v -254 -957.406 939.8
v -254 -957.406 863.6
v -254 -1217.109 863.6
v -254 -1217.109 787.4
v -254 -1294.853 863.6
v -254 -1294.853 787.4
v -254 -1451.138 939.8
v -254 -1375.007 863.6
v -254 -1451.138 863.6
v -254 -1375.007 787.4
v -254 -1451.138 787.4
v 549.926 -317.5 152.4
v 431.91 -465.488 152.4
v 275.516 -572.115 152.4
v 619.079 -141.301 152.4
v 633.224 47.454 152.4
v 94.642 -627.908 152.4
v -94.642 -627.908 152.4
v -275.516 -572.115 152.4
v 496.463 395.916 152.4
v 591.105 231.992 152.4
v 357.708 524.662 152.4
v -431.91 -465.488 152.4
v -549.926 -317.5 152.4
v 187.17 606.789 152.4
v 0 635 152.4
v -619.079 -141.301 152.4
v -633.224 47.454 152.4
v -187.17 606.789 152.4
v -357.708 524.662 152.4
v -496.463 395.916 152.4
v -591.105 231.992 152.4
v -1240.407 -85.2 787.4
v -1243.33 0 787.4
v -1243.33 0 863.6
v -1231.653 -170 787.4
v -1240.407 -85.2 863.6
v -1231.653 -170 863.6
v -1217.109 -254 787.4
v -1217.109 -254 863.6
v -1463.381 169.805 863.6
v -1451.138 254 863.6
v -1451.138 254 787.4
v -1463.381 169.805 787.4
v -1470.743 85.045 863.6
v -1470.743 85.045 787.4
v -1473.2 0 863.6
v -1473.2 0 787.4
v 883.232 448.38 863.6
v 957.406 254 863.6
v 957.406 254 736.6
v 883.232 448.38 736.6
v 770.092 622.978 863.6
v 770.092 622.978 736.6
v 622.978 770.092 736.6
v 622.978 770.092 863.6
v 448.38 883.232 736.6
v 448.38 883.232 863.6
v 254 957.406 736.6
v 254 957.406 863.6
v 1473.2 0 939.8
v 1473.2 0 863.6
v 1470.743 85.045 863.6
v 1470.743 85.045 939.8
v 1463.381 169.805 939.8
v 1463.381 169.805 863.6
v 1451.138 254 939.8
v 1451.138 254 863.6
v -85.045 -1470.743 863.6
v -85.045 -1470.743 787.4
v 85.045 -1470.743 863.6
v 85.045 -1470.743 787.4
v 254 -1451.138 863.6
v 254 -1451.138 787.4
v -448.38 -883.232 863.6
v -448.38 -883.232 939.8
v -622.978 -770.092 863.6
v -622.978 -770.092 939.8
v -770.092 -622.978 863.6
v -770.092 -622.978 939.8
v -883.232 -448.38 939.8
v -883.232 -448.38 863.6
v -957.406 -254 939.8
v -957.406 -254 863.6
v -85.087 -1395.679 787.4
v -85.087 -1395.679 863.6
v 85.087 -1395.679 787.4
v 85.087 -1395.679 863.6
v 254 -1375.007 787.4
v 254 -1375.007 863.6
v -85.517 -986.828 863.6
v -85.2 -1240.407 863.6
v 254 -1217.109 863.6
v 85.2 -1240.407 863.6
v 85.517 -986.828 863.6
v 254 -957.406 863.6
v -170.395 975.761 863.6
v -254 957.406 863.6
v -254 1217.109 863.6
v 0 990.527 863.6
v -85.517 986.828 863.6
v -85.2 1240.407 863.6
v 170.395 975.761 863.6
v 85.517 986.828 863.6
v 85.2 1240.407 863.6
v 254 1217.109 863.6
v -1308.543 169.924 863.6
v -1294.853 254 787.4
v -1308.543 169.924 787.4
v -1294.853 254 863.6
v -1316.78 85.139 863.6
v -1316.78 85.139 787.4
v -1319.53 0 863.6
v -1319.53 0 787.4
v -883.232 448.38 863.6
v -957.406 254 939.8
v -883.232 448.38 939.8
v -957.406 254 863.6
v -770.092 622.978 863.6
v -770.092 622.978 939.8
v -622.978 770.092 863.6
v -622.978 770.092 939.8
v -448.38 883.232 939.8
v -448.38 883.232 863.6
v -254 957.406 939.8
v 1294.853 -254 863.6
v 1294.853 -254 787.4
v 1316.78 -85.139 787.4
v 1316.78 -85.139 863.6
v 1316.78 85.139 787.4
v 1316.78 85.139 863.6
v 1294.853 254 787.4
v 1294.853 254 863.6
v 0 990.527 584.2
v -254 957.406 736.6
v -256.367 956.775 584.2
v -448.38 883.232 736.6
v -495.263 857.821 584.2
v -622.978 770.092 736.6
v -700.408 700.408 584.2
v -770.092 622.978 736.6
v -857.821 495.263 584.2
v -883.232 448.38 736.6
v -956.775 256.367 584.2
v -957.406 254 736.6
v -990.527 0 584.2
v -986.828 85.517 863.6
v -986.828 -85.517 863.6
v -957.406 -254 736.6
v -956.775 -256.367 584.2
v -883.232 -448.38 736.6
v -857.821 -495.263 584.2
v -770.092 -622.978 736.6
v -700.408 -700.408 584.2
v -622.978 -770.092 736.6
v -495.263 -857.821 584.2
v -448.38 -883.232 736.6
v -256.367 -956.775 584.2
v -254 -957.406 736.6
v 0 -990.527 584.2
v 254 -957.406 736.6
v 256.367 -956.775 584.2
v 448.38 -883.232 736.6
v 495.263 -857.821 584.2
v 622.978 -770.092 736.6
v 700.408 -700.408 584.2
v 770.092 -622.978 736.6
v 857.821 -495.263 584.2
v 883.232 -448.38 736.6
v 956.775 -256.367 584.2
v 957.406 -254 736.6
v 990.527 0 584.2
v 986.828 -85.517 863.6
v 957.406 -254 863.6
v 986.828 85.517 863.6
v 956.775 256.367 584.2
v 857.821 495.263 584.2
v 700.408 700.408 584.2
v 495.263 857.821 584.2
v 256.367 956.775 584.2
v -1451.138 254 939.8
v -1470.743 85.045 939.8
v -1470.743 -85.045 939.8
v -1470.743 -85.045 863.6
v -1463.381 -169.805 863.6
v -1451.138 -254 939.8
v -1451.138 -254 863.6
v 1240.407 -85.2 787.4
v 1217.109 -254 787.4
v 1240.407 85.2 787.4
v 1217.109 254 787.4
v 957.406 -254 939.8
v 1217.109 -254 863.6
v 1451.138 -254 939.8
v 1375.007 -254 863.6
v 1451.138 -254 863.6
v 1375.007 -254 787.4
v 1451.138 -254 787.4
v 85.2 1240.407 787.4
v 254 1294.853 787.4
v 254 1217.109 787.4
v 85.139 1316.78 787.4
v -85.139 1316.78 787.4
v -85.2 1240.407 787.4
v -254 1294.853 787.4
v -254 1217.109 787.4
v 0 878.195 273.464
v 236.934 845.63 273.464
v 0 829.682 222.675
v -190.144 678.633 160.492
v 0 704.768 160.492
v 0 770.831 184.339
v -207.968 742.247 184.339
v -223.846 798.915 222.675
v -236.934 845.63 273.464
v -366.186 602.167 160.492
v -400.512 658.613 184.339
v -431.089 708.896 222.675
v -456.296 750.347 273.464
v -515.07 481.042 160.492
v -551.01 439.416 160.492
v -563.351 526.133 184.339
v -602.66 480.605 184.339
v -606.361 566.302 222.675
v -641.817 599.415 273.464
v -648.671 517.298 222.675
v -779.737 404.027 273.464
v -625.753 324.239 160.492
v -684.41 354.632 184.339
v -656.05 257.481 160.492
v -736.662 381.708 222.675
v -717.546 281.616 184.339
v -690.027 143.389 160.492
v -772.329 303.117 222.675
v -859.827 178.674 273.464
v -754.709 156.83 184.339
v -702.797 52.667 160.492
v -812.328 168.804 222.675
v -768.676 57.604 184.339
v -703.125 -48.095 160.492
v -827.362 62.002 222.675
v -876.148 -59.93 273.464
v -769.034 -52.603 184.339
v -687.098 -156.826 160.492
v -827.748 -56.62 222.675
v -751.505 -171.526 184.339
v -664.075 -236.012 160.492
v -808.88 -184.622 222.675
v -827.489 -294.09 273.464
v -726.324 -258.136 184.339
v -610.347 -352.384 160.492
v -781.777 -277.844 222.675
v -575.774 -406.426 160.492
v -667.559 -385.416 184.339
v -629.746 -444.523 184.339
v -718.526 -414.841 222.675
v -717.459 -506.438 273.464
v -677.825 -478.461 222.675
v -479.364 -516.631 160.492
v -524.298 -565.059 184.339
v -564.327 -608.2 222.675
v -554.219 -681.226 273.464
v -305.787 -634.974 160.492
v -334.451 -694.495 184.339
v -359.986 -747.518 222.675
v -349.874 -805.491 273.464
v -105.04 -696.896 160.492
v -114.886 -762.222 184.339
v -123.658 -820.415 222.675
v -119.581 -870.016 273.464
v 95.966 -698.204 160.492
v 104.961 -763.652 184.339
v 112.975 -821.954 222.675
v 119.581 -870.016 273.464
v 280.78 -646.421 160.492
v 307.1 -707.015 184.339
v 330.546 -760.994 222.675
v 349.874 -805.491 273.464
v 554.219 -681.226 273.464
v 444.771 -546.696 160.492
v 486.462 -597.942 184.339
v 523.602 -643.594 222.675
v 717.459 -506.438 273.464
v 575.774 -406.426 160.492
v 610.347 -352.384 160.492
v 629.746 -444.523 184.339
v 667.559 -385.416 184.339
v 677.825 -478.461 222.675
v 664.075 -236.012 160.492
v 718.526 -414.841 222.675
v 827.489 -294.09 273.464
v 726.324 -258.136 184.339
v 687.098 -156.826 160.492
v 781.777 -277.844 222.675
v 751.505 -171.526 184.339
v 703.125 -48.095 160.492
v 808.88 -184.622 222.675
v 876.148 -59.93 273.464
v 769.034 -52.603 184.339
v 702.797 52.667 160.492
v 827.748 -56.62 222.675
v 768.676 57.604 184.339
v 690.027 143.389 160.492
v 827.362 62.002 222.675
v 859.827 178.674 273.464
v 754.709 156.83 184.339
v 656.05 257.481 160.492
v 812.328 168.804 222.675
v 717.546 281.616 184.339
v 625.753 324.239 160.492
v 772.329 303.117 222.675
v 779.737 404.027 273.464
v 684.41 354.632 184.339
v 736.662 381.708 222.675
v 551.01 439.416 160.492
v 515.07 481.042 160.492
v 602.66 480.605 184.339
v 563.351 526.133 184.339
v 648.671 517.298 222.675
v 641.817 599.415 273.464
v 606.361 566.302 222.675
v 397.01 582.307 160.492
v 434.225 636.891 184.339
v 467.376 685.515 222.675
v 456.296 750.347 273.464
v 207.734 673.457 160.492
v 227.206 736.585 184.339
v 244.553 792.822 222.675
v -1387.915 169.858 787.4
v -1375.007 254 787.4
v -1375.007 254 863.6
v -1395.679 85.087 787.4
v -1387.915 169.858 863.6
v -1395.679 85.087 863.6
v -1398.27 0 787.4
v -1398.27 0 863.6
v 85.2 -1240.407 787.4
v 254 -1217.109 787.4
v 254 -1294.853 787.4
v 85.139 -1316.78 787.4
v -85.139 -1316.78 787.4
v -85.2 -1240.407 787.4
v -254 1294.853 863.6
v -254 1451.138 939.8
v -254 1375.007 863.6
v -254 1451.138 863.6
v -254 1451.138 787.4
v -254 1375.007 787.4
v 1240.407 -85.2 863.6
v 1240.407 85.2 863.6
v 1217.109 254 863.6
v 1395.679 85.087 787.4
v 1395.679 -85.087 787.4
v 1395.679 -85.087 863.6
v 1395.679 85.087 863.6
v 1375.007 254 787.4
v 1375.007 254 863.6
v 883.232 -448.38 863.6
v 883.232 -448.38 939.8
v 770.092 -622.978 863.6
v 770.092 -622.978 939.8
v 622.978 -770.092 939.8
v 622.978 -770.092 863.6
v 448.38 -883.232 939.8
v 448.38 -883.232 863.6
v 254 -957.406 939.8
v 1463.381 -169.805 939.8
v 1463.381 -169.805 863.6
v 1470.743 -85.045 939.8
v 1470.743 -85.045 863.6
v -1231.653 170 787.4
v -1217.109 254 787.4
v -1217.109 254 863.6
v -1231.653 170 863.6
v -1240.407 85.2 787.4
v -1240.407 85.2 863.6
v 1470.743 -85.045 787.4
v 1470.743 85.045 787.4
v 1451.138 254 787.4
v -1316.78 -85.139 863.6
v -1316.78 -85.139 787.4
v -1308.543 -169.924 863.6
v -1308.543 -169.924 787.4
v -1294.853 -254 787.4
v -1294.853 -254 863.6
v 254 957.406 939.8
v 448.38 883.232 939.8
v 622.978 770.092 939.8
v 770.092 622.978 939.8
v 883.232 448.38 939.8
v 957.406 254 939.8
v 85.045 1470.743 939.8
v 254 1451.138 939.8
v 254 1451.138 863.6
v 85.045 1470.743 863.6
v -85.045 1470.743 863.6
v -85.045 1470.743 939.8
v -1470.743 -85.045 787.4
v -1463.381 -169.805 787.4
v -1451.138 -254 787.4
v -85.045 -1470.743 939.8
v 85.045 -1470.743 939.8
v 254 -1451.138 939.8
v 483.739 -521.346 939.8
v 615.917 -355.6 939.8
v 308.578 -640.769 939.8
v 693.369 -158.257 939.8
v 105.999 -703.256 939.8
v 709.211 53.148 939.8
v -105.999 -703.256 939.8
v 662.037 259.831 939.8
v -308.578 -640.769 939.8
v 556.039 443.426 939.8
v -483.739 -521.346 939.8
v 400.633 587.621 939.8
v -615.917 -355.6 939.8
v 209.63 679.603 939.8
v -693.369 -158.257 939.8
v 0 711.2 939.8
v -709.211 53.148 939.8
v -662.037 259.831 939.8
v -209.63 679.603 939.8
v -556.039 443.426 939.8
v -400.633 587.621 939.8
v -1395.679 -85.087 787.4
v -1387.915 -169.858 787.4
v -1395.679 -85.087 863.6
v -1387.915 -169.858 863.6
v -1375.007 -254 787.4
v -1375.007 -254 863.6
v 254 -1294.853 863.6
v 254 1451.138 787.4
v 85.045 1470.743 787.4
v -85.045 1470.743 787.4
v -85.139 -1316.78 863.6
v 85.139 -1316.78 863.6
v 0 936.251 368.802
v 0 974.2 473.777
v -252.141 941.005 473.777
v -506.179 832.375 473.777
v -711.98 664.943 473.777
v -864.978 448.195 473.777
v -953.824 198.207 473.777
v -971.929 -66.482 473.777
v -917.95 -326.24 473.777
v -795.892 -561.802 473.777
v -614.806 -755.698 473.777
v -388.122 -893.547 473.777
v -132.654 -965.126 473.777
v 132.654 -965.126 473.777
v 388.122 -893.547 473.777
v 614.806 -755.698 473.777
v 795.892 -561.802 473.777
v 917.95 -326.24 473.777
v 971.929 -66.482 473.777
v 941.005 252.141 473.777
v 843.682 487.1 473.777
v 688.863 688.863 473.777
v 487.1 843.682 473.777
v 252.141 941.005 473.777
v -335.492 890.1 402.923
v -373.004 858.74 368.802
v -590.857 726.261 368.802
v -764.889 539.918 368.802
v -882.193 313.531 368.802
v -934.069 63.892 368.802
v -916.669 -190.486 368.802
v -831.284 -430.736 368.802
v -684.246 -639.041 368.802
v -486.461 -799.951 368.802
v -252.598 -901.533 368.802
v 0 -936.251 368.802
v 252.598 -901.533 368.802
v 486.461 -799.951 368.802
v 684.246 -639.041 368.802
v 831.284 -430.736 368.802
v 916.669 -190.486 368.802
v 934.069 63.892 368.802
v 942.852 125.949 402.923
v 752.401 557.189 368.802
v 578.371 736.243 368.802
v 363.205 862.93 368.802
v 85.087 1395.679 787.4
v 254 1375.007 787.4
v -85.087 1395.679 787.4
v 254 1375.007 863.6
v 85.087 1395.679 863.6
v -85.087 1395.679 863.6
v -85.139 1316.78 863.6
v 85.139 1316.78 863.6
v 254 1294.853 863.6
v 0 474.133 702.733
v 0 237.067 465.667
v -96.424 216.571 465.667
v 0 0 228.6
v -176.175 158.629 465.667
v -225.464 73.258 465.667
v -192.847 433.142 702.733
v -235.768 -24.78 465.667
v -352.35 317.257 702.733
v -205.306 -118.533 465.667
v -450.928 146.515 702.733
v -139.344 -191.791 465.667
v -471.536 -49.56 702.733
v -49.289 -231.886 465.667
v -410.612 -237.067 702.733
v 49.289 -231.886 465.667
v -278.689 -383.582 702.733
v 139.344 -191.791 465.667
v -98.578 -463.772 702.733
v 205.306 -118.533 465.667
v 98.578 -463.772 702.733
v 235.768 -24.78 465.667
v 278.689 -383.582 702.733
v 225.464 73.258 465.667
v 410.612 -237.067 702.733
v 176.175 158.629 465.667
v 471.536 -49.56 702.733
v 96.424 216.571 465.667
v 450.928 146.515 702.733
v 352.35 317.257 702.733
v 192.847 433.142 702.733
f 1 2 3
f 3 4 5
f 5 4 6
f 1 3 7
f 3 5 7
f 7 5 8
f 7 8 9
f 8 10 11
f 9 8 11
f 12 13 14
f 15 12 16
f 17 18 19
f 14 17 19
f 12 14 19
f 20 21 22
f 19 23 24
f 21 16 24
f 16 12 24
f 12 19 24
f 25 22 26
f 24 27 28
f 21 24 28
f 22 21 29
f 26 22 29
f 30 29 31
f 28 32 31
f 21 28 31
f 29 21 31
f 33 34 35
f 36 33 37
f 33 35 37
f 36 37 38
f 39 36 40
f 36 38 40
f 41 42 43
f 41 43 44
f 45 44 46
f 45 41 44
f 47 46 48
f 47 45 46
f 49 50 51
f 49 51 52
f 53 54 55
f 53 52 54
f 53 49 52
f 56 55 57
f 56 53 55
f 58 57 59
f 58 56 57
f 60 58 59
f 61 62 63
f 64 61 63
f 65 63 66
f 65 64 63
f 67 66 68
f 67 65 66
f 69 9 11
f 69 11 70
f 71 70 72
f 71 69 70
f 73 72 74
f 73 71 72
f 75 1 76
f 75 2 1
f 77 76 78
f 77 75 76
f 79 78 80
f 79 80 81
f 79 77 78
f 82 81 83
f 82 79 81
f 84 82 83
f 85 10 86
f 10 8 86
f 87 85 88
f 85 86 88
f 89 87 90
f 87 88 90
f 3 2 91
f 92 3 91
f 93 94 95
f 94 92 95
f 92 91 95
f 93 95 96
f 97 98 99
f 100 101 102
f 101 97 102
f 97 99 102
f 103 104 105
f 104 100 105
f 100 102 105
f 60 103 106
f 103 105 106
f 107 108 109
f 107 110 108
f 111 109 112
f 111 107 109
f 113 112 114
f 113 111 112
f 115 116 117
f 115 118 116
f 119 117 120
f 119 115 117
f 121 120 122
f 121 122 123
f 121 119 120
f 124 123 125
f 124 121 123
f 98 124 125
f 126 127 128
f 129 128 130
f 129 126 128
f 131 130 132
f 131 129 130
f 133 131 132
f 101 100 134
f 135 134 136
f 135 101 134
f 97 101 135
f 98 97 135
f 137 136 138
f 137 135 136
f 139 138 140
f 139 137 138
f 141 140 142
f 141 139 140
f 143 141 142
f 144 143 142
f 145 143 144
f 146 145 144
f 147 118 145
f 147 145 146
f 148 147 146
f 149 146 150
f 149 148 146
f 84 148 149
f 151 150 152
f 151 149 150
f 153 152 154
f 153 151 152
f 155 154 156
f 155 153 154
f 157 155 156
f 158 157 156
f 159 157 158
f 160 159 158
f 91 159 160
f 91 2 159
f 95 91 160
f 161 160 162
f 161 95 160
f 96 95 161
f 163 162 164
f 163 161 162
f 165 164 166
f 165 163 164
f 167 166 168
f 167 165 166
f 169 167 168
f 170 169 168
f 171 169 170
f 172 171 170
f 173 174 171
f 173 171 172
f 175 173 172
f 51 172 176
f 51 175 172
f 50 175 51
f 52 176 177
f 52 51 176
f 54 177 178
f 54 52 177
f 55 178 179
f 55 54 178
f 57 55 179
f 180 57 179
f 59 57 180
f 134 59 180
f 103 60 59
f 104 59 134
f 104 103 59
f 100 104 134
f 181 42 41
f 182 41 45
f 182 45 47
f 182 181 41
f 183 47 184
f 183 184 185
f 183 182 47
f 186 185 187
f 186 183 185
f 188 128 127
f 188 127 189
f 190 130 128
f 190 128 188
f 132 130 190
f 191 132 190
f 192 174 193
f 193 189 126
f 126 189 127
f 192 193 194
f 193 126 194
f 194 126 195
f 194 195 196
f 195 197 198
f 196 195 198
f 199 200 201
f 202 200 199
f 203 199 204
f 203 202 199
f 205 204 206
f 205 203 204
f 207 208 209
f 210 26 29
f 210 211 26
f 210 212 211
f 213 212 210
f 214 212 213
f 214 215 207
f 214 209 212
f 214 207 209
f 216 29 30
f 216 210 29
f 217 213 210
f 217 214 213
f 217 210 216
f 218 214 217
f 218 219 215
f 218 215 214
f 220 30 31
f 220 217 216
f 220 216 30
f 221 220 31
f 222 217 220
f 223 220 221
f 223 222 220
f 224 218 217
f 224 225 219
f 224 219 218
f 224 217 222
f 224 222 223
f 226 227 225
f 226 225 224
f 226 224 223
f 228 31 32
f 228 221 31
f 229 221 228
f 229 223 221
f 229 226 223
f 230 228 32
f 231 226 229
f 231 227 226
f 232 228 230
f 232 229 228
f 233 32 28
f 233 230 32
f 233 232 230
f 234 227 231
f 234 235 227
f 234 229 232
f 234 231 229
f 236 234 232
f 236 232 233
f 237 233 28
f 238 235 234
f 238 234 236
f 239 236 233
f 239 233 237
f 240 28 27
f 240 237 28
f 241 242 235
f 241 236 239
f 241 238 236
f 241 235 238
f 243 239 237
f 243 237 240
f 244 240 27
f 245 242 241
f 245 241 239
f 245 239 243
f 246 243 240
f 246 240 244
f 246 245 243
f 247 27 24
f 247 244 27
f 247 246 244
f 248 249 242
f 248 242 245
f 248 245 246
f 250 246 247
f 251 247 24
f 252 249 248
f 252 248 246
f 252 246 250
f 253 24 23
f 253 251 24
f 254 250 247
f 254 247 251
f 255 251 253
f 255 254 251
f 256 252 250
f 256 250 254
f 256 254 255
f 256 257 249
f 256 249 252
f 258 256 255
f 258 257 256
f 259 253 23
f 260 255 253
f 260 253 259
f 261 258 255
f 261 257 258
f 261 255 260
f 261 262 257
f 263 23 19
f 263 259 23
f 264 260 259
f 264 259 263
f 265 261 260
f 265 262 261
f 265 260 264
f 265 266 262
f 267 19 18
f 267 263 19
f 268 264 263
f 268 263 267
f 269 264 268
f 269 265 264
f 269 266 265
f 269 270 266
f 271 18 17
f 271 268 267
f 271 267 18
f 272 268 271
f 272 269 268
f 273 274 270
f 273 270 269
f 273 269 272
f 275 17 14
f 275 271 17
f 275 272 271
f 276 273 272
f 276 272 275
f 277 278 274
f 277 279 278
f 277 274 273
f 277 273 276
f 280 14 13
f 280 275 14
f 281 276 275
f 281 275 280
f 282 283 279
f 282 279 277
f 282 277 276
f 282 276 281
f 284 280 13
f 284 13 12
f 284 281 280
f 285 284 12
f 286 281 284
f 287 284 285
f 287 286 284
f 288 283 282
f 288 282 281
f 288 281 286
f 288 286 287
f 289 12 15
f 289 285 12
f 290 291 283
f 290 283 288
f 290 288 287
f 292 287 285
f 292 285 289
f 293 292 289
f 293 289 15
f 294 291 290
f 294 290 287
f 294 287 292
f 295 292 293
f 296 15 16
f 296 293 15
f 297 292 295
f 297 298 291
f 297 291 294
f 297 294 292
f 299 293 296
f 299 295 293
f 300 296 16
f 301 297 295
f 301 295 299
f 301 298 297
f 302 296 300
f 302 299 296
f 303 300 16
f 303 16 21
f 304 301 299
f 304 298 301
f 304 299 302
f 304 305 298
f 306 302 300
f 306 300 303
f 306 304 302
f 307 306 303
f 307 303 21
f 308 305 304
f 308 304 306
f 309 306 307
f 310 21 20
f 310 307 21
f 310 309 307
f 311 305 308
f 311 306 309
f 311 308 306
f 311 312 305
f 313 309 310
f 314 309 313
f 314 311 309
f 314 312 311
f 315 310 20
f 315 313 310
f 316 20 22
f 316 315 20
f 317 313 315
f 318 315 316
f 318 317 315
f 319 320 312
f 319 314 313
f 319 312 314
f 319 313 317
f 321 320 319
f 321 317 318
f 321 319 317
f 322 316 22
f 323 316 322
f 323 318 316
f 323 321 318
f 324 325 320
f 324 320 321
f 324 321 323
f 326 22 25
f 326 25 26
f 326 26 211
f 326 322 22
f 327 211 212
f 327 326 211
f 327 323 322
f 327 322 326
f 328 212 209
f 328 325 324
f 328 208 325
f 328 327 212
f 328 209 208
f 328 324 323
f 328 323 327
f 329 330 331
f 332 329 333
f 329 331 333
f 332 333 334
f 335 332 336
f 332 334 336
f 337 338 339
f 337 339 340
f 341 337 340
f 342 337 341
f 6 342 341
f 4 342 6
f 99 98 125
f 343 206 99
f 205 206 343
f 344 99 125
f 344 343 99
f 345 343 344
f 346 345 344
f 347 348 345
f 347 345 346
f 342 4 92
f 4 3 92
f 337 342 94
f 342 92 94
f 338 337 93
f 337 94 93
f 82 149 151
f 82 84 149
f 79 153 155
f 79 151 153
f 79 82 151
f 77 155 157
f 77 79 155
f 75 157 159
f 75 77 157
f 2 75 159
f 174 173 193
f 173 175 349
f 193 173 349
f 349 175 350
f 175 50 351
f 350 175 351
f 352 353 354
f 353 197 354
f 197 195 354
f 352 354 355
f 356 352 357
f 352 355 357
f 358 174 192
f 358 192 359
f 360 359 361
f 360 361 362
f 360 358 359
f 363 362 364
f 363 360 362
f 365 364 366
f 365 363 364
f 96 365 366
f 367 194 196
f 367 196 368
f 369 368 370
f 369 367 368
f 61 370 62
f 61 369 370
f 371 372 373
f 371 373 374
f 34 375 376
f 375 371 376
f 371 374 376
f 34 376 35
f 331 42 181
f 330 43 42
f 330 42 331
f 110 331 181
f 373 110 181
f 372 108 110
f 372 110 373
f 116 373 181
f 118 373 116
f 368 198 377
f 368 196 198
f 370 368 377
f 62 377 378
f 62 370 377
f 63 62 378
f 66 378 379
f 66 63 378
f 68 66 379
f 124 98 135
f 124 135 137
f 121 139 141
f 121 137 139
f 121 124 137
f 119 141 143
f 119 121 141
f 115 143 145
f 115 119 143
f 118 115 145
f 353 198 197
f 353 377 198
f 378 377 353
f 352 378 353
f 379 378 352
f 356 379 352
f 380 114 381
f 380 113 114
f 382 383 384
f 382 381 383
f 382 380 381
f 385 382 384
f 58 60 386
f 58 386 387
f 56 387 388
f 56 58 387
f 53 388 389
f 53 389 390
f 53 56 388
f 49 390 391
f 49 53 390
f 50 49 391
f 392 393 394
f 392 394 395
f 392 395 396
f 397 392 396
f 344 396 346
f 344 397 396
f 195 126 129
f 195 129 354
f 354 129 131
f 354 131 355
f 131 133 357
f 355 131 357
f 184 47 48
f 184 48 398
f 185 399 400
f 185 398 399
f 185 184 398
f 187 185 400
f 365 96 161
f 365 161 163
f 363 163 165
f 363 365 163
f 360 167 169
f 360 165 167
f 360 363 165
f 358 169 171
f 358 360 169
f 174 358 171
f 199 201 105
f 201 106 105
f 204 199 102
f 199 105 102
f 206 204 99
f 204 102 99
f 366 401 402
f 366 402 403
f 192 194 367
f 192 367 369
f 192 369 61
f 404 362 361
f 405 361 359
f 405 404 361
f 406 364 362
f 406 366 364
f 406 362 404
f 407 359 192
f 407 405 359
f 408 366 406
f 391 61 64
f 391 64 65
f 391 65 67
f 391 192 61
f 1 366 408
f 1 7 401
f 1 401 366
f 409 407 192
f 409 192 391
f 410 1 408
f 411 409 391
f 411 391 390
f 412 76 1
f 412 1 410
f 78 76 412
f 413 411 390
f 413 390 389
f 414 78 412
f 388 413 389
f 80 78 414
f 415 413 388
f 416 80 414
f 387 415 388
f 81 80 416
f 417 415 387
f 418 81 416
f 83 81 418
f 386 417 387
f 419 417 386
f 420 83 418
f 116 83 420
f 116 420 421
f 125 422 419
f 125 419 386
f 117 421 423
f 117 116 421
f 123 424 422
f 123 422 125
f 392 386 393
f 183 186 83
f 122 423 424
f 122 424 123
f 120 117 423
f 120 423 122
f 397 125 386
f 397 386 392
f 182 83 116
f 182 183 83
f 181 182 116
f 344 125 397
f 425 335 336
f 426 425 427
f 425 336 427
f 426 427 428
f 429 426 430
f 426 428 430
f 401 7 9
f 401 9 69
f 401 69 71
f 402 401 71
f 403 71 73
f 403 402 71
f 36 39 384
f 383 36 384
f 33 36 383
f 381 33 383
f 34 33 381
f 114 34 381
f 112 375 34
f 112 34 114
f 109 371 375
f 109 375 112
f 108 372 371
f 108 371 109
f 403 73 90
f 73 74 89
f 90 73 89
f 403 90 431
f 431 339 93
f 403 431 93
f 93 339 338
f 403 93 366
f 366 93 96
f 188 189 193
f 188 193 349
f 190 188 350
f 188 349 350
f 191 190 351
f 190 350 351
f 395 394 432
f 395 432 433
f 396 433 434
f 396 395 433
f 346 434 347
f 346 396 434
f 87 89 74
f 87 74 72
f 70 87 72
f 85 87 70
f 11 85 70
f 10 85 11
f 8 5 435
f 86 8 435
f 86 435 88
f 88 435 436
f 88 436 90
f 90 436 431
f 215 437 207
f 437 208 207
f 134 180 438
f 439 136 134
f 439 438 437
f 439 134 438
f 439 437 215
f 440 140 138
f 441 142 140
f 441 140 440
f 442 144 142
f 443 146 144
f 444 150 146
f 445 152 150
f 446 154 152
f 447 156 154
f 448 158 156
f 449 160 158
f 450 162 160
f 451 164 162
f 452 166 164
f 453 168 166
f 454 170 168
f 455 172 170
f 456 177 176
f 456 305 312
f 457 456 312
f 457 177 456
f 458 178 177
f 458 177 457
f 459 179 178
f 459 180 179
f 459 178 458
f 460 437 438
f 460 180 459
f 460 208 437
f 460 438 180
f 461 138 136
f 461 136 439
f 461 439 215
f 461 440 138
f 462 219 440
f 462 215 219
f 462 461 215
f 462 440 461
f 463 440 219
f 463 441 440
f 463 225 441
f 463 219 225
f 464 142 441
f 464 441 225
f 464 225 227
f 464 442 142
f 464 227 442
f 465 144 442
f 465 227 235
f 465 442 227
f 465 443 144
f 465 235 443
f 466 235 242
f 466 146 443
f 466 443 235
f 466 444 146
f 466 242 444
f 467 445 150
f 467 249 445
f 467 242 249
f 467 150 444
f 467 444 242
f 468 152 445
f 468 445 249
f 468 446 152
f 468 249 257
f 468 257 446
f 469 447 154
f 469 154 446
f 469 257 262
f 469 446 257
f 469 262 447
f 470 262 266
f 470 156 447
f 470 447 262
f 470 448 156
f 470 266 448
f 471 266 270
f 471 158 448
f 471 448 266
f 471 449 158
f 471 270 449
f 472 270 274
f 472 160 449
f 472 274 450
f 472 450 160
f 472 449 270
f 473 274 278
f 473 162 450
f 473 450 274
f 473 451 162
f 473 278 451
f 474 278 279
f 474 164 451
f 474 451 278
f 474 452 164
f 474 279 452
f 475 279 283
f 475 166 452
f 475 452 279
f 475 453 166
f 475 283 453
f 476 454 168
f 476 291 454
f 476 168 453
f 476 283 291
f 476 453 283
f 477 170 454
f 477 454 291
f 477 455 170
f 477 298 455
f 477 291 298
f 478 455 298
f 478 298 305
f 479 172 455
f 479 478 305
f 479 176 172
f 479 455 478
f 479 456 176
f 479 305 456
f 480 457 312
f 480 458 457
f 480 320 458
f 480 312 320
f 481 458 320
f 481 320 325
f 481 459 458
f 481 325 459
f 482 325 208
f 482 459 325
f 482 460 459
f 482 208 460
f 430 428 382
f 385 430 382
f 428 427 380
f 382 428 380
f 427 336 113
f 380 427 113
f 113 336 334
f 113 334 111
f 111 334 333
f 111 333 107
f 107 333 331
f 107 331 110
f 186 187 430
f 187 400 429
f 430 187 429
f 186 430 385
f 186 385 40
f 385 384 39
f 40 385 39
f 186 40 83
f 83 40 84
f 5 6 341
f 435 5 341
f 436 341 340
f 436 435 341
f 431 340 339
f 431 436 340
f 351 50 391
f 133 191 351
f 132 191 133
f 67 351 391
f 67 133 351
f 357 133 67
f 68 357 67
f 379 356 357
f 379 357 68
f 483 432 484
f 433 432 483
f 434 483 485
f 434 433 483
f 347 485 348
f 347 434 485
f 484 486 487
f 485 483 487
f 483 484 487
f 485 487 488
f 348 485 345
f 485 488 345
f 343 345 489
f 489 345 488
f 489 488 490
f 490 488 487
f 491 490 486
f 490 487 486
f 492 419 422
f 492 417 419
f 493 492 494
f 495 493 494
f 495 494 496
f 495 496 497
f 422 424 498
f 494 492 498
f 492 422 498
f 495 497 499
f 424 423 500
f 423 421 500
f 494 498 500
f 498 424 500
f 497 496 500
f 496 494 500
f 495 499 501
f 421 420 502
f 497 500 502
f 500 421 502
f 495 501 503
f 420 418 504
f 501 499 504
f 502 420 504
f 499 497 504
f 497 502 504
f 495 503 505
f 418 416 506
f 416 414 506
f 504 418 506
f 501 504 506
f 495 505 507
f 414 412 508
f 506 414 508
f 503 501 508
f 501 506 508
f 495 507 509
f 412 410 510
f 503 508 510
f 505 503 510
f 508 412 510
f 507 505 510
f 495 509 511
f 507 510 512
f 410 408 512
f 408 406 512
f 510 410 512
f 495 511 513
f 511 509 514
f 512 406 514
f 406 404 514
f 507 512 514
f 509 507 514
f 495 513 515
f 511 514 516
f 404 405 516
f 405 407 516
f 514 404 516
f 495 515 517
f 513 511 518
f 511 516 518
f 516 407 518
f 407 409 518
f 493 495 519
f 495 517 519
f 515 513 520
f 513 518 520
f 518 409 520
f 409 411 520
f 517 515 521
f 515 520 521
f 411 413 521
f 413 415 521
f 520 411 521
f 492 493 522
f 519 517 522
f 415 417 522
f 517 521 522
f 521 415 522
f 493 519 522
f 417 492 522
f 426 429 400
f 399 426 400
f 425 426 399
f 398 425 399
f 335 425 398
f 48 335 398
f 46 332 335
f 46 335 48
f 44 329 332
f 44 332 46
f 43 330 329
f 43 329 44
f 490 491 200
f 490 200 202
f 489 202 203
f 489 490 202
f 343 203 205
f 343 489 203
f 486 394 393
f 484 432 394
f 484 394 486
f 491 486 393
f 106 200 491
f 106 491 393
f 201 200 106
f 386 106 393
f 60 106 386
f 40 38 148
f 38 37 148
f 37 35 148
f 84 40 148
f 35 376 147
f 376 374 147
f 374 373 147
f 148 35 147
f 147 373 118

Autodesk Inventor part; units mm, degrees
ref_plane "YZ Plane" through (0, 0, 0) normal (1, 0, 0) x (0, 1, 0)
ref_plane "XZ Plane" through (0, 0, 0) normal (0, 1, 0) x (-1, 0, 0)
ref_plane "XY Plane" through (0, 0, 0) normal (0, 0, 1) x (1, 0, 0)
sketch "Sketch1" plane through (0, 0, 0) normal (0, 1, 0) x (-1, 0, 0)
  point P0 (0, 0)
sketch "Sketch2" plane through (0, 0, 0) normal (0, 1, 0) x (-1, 0, 0)
  point P0 (0, 0)
sketch "Sketch3" plane through (0, 0, 0) normal (1, 0, 0) x (0, 1, 0)
  line L0 (0, 0) -> (635, 0) construction
  line L1 (0, 0) -> (0, 76.2) construction
  line L2 (0, 76.2) -> (635, 76.2) construction
  arc A0 (635, 0) -> (999.7931, 181.5955) centre (635, 457.2) ccw construction
  arc A1 (635, 76.2) -> (938.9942, 227.5296) centre (635, 457.2) ccw construction
  arc A2 (938.9942, 227.5296) -> (1066.8, 584.2) centre (432.3372, 610.3136) ccw construction
  arc A3 (999.7931, 181.5955) -> (1136.1393, 508) centre (432.3372, 610.3136) ccw construction
  line L3 (1397, 584.2) -> (1397, 508) construction
  line L4 (1397, 508) -> (1136.1393, 508) construction
  line L5 (1066.8, 584.2) -> (1320.8, 584.2) construction
  line L6 (1320.8, 584.2) -> (1320.8, 685.8) construction
  line L7 (1320.8, 685.8) -> (1397, 685.8) construction
  line L8 (1397, 685.8) -> (1397, 584.2) construction
  line L9 (635, 0) -> (1103.7061, 0) construction
  line L10 (1103.7061, 0) -> (1397, 508) construction
  line L11 (0, 152.4) -> (635, 152.4)
  arc A4 (635, 152.4) -> (878.1954, 273.4637) centre (635, 457.2) ccw
  arc A5 (878.1954, 273.4637) -> (990.5267, 584.2) centre (432.3372, 610.3136) ccw
  line L12 (990.5267, 584.2) -> (990.5267, 939.8)
  line L13 (990.5267, 939.8) -> (914.3267, 939.8)
  line L14 (914.3267, 939.8) -> (914.3267, 586.0467) construction
  line L15 (635, 228.6) -> (0, 228.6) construction
  line L16 (0, 228.6) -> (0, 152.4)
  arc A6 (817.3965, 319.3977) -> (914.3267, 586.0467) centre (432.3372, 610.3136) ccw
  arc A7 (635, 228.6) -> (817.3965, 319.3977) centre (635, 457.2) ccw construction
  line L17 (914.3267, 939.8) -> (711.2, 939.8)
  line L18 (711.2, 939.8) -> (0, 228.6)
  dimension "d0" = 1397
  dimension "d1" = 76.2
  dimension "d3" = 635
  dimension "d4" = 101.6
  dimension "d5" = 76.2
  dimension "d6" = 254
  dimension "d7" = 685.8
  dimension "d8" = 60
  dimension "d9" = 635
  dimension "d10" = 381
  dimension "d32" = 76.2
  dimension "d33" = 355.6
  dimension "d34" = 45
revolve "Revolution1" add sketch "Sketch3" angle 360 about axis through (0, 0, 0) along (0, 0, 1)
sketch "Sketch7" plane through (0, 0, 939.8) normal (0, 0, 1) x (1, 0, 0)
  circle A0 centre (0, 0) radius 990.5267
  circle A1 centre (0, 0) radius 1473.2
  circle A2 centre (0, 0) radius 990.5267 projected
  dimension "d35" = 2946.4
extrude "Extrusion4" add sketch "Sketch7" against normal blind 76.2
sketch "Sketch8" plane through (0, 0, 863.6) normal (0, 0, -1) x (-1, 0, 0)
  circle A0 centre (0, 0) radius 1473.2
  circle A1 centre (0, 0) radius 1398.27
  circle A2 centre (0, 0) radius 1319.53
  circle A3 centre (0, 0) radius 1243.33
  circle A4 centre (0, 0) radius 1473.2 projected
  dimension "d38" = 74.93
  dimension "d39" = 76.2
  dimension "d40" = 78.74
extrude "Extrusion5" add sketch "Sketch8" along normal blind 76.2
sketch "Sketch9" plane through (0, 0, 863.6) normal (0, 0, -1) x (-1, 0, 0)
  circle A0 centre (0, 0) radius 990.5267
  circle A1 centre (0, 0) radius 990.5267 projected
  circle A2 centre (0, 0) radius 990.5267 projected
  line L0 (-957.4064, 254) -> (-1726.5763, 254)
  line L1 (-1726.5763, 254) -> (-1726.5763, 2407.0489)
  line L2 (-1726.5763, 2407.0489) -> (-254, 2407.0489)
  line L3 (-254, 2407.0489) -> (-254, 957.4064)
  line L4 (254, 957.4064) -> (254, 2407.0489)
  line L5 (254, 2407.0489) -> (1885.1535, 2407.0489)
  line L6 (1885.1535, 2407.0489) -> (1885.1535, 254)
  line L7 (1885.1535, 254) -> (957.4064, 254)
  line L8 (-957.4064, -254) -> (-1726.5763, -254)
  line L9 (-1726.5763, -254) -> (-1726.5763, -2420.2811)
  line L10 (-1726.5763, -2420.2811) -> (-254, -2420.2811)
  line L11 (-254, -2420.2811) -> (-254, -957.4064)
  line L12 (254, -957.4064) -> (254, -2461.2485)
  line L13 (254, -2461.2485) -> (1932.9488, -2461.2485)
  line L14 (1932.9488, -2461.2485) -> (1932.9488, -254)
  line L15 (1932.9488, -254) -> (957.4064, -254)
  point P0 (254, -1709.3275)
  dimension "d43" = 508
  dimension "d44" = 508
  dimension "d45" = 508
  dimension "d46" = 508
  dimension "d47" = 254
  dimension "d48" = 254
extrude "Extrusion6" cut sketch "Sketch9" against normal blind 127 and the other way blind 127 contours A0 L4 L5 L6 L7 | L15 L14 L13 L12 A0 | A0 L0 L1 L2 L3 | L11 L10 L9 L8 A0
properties part number "TopV2"
